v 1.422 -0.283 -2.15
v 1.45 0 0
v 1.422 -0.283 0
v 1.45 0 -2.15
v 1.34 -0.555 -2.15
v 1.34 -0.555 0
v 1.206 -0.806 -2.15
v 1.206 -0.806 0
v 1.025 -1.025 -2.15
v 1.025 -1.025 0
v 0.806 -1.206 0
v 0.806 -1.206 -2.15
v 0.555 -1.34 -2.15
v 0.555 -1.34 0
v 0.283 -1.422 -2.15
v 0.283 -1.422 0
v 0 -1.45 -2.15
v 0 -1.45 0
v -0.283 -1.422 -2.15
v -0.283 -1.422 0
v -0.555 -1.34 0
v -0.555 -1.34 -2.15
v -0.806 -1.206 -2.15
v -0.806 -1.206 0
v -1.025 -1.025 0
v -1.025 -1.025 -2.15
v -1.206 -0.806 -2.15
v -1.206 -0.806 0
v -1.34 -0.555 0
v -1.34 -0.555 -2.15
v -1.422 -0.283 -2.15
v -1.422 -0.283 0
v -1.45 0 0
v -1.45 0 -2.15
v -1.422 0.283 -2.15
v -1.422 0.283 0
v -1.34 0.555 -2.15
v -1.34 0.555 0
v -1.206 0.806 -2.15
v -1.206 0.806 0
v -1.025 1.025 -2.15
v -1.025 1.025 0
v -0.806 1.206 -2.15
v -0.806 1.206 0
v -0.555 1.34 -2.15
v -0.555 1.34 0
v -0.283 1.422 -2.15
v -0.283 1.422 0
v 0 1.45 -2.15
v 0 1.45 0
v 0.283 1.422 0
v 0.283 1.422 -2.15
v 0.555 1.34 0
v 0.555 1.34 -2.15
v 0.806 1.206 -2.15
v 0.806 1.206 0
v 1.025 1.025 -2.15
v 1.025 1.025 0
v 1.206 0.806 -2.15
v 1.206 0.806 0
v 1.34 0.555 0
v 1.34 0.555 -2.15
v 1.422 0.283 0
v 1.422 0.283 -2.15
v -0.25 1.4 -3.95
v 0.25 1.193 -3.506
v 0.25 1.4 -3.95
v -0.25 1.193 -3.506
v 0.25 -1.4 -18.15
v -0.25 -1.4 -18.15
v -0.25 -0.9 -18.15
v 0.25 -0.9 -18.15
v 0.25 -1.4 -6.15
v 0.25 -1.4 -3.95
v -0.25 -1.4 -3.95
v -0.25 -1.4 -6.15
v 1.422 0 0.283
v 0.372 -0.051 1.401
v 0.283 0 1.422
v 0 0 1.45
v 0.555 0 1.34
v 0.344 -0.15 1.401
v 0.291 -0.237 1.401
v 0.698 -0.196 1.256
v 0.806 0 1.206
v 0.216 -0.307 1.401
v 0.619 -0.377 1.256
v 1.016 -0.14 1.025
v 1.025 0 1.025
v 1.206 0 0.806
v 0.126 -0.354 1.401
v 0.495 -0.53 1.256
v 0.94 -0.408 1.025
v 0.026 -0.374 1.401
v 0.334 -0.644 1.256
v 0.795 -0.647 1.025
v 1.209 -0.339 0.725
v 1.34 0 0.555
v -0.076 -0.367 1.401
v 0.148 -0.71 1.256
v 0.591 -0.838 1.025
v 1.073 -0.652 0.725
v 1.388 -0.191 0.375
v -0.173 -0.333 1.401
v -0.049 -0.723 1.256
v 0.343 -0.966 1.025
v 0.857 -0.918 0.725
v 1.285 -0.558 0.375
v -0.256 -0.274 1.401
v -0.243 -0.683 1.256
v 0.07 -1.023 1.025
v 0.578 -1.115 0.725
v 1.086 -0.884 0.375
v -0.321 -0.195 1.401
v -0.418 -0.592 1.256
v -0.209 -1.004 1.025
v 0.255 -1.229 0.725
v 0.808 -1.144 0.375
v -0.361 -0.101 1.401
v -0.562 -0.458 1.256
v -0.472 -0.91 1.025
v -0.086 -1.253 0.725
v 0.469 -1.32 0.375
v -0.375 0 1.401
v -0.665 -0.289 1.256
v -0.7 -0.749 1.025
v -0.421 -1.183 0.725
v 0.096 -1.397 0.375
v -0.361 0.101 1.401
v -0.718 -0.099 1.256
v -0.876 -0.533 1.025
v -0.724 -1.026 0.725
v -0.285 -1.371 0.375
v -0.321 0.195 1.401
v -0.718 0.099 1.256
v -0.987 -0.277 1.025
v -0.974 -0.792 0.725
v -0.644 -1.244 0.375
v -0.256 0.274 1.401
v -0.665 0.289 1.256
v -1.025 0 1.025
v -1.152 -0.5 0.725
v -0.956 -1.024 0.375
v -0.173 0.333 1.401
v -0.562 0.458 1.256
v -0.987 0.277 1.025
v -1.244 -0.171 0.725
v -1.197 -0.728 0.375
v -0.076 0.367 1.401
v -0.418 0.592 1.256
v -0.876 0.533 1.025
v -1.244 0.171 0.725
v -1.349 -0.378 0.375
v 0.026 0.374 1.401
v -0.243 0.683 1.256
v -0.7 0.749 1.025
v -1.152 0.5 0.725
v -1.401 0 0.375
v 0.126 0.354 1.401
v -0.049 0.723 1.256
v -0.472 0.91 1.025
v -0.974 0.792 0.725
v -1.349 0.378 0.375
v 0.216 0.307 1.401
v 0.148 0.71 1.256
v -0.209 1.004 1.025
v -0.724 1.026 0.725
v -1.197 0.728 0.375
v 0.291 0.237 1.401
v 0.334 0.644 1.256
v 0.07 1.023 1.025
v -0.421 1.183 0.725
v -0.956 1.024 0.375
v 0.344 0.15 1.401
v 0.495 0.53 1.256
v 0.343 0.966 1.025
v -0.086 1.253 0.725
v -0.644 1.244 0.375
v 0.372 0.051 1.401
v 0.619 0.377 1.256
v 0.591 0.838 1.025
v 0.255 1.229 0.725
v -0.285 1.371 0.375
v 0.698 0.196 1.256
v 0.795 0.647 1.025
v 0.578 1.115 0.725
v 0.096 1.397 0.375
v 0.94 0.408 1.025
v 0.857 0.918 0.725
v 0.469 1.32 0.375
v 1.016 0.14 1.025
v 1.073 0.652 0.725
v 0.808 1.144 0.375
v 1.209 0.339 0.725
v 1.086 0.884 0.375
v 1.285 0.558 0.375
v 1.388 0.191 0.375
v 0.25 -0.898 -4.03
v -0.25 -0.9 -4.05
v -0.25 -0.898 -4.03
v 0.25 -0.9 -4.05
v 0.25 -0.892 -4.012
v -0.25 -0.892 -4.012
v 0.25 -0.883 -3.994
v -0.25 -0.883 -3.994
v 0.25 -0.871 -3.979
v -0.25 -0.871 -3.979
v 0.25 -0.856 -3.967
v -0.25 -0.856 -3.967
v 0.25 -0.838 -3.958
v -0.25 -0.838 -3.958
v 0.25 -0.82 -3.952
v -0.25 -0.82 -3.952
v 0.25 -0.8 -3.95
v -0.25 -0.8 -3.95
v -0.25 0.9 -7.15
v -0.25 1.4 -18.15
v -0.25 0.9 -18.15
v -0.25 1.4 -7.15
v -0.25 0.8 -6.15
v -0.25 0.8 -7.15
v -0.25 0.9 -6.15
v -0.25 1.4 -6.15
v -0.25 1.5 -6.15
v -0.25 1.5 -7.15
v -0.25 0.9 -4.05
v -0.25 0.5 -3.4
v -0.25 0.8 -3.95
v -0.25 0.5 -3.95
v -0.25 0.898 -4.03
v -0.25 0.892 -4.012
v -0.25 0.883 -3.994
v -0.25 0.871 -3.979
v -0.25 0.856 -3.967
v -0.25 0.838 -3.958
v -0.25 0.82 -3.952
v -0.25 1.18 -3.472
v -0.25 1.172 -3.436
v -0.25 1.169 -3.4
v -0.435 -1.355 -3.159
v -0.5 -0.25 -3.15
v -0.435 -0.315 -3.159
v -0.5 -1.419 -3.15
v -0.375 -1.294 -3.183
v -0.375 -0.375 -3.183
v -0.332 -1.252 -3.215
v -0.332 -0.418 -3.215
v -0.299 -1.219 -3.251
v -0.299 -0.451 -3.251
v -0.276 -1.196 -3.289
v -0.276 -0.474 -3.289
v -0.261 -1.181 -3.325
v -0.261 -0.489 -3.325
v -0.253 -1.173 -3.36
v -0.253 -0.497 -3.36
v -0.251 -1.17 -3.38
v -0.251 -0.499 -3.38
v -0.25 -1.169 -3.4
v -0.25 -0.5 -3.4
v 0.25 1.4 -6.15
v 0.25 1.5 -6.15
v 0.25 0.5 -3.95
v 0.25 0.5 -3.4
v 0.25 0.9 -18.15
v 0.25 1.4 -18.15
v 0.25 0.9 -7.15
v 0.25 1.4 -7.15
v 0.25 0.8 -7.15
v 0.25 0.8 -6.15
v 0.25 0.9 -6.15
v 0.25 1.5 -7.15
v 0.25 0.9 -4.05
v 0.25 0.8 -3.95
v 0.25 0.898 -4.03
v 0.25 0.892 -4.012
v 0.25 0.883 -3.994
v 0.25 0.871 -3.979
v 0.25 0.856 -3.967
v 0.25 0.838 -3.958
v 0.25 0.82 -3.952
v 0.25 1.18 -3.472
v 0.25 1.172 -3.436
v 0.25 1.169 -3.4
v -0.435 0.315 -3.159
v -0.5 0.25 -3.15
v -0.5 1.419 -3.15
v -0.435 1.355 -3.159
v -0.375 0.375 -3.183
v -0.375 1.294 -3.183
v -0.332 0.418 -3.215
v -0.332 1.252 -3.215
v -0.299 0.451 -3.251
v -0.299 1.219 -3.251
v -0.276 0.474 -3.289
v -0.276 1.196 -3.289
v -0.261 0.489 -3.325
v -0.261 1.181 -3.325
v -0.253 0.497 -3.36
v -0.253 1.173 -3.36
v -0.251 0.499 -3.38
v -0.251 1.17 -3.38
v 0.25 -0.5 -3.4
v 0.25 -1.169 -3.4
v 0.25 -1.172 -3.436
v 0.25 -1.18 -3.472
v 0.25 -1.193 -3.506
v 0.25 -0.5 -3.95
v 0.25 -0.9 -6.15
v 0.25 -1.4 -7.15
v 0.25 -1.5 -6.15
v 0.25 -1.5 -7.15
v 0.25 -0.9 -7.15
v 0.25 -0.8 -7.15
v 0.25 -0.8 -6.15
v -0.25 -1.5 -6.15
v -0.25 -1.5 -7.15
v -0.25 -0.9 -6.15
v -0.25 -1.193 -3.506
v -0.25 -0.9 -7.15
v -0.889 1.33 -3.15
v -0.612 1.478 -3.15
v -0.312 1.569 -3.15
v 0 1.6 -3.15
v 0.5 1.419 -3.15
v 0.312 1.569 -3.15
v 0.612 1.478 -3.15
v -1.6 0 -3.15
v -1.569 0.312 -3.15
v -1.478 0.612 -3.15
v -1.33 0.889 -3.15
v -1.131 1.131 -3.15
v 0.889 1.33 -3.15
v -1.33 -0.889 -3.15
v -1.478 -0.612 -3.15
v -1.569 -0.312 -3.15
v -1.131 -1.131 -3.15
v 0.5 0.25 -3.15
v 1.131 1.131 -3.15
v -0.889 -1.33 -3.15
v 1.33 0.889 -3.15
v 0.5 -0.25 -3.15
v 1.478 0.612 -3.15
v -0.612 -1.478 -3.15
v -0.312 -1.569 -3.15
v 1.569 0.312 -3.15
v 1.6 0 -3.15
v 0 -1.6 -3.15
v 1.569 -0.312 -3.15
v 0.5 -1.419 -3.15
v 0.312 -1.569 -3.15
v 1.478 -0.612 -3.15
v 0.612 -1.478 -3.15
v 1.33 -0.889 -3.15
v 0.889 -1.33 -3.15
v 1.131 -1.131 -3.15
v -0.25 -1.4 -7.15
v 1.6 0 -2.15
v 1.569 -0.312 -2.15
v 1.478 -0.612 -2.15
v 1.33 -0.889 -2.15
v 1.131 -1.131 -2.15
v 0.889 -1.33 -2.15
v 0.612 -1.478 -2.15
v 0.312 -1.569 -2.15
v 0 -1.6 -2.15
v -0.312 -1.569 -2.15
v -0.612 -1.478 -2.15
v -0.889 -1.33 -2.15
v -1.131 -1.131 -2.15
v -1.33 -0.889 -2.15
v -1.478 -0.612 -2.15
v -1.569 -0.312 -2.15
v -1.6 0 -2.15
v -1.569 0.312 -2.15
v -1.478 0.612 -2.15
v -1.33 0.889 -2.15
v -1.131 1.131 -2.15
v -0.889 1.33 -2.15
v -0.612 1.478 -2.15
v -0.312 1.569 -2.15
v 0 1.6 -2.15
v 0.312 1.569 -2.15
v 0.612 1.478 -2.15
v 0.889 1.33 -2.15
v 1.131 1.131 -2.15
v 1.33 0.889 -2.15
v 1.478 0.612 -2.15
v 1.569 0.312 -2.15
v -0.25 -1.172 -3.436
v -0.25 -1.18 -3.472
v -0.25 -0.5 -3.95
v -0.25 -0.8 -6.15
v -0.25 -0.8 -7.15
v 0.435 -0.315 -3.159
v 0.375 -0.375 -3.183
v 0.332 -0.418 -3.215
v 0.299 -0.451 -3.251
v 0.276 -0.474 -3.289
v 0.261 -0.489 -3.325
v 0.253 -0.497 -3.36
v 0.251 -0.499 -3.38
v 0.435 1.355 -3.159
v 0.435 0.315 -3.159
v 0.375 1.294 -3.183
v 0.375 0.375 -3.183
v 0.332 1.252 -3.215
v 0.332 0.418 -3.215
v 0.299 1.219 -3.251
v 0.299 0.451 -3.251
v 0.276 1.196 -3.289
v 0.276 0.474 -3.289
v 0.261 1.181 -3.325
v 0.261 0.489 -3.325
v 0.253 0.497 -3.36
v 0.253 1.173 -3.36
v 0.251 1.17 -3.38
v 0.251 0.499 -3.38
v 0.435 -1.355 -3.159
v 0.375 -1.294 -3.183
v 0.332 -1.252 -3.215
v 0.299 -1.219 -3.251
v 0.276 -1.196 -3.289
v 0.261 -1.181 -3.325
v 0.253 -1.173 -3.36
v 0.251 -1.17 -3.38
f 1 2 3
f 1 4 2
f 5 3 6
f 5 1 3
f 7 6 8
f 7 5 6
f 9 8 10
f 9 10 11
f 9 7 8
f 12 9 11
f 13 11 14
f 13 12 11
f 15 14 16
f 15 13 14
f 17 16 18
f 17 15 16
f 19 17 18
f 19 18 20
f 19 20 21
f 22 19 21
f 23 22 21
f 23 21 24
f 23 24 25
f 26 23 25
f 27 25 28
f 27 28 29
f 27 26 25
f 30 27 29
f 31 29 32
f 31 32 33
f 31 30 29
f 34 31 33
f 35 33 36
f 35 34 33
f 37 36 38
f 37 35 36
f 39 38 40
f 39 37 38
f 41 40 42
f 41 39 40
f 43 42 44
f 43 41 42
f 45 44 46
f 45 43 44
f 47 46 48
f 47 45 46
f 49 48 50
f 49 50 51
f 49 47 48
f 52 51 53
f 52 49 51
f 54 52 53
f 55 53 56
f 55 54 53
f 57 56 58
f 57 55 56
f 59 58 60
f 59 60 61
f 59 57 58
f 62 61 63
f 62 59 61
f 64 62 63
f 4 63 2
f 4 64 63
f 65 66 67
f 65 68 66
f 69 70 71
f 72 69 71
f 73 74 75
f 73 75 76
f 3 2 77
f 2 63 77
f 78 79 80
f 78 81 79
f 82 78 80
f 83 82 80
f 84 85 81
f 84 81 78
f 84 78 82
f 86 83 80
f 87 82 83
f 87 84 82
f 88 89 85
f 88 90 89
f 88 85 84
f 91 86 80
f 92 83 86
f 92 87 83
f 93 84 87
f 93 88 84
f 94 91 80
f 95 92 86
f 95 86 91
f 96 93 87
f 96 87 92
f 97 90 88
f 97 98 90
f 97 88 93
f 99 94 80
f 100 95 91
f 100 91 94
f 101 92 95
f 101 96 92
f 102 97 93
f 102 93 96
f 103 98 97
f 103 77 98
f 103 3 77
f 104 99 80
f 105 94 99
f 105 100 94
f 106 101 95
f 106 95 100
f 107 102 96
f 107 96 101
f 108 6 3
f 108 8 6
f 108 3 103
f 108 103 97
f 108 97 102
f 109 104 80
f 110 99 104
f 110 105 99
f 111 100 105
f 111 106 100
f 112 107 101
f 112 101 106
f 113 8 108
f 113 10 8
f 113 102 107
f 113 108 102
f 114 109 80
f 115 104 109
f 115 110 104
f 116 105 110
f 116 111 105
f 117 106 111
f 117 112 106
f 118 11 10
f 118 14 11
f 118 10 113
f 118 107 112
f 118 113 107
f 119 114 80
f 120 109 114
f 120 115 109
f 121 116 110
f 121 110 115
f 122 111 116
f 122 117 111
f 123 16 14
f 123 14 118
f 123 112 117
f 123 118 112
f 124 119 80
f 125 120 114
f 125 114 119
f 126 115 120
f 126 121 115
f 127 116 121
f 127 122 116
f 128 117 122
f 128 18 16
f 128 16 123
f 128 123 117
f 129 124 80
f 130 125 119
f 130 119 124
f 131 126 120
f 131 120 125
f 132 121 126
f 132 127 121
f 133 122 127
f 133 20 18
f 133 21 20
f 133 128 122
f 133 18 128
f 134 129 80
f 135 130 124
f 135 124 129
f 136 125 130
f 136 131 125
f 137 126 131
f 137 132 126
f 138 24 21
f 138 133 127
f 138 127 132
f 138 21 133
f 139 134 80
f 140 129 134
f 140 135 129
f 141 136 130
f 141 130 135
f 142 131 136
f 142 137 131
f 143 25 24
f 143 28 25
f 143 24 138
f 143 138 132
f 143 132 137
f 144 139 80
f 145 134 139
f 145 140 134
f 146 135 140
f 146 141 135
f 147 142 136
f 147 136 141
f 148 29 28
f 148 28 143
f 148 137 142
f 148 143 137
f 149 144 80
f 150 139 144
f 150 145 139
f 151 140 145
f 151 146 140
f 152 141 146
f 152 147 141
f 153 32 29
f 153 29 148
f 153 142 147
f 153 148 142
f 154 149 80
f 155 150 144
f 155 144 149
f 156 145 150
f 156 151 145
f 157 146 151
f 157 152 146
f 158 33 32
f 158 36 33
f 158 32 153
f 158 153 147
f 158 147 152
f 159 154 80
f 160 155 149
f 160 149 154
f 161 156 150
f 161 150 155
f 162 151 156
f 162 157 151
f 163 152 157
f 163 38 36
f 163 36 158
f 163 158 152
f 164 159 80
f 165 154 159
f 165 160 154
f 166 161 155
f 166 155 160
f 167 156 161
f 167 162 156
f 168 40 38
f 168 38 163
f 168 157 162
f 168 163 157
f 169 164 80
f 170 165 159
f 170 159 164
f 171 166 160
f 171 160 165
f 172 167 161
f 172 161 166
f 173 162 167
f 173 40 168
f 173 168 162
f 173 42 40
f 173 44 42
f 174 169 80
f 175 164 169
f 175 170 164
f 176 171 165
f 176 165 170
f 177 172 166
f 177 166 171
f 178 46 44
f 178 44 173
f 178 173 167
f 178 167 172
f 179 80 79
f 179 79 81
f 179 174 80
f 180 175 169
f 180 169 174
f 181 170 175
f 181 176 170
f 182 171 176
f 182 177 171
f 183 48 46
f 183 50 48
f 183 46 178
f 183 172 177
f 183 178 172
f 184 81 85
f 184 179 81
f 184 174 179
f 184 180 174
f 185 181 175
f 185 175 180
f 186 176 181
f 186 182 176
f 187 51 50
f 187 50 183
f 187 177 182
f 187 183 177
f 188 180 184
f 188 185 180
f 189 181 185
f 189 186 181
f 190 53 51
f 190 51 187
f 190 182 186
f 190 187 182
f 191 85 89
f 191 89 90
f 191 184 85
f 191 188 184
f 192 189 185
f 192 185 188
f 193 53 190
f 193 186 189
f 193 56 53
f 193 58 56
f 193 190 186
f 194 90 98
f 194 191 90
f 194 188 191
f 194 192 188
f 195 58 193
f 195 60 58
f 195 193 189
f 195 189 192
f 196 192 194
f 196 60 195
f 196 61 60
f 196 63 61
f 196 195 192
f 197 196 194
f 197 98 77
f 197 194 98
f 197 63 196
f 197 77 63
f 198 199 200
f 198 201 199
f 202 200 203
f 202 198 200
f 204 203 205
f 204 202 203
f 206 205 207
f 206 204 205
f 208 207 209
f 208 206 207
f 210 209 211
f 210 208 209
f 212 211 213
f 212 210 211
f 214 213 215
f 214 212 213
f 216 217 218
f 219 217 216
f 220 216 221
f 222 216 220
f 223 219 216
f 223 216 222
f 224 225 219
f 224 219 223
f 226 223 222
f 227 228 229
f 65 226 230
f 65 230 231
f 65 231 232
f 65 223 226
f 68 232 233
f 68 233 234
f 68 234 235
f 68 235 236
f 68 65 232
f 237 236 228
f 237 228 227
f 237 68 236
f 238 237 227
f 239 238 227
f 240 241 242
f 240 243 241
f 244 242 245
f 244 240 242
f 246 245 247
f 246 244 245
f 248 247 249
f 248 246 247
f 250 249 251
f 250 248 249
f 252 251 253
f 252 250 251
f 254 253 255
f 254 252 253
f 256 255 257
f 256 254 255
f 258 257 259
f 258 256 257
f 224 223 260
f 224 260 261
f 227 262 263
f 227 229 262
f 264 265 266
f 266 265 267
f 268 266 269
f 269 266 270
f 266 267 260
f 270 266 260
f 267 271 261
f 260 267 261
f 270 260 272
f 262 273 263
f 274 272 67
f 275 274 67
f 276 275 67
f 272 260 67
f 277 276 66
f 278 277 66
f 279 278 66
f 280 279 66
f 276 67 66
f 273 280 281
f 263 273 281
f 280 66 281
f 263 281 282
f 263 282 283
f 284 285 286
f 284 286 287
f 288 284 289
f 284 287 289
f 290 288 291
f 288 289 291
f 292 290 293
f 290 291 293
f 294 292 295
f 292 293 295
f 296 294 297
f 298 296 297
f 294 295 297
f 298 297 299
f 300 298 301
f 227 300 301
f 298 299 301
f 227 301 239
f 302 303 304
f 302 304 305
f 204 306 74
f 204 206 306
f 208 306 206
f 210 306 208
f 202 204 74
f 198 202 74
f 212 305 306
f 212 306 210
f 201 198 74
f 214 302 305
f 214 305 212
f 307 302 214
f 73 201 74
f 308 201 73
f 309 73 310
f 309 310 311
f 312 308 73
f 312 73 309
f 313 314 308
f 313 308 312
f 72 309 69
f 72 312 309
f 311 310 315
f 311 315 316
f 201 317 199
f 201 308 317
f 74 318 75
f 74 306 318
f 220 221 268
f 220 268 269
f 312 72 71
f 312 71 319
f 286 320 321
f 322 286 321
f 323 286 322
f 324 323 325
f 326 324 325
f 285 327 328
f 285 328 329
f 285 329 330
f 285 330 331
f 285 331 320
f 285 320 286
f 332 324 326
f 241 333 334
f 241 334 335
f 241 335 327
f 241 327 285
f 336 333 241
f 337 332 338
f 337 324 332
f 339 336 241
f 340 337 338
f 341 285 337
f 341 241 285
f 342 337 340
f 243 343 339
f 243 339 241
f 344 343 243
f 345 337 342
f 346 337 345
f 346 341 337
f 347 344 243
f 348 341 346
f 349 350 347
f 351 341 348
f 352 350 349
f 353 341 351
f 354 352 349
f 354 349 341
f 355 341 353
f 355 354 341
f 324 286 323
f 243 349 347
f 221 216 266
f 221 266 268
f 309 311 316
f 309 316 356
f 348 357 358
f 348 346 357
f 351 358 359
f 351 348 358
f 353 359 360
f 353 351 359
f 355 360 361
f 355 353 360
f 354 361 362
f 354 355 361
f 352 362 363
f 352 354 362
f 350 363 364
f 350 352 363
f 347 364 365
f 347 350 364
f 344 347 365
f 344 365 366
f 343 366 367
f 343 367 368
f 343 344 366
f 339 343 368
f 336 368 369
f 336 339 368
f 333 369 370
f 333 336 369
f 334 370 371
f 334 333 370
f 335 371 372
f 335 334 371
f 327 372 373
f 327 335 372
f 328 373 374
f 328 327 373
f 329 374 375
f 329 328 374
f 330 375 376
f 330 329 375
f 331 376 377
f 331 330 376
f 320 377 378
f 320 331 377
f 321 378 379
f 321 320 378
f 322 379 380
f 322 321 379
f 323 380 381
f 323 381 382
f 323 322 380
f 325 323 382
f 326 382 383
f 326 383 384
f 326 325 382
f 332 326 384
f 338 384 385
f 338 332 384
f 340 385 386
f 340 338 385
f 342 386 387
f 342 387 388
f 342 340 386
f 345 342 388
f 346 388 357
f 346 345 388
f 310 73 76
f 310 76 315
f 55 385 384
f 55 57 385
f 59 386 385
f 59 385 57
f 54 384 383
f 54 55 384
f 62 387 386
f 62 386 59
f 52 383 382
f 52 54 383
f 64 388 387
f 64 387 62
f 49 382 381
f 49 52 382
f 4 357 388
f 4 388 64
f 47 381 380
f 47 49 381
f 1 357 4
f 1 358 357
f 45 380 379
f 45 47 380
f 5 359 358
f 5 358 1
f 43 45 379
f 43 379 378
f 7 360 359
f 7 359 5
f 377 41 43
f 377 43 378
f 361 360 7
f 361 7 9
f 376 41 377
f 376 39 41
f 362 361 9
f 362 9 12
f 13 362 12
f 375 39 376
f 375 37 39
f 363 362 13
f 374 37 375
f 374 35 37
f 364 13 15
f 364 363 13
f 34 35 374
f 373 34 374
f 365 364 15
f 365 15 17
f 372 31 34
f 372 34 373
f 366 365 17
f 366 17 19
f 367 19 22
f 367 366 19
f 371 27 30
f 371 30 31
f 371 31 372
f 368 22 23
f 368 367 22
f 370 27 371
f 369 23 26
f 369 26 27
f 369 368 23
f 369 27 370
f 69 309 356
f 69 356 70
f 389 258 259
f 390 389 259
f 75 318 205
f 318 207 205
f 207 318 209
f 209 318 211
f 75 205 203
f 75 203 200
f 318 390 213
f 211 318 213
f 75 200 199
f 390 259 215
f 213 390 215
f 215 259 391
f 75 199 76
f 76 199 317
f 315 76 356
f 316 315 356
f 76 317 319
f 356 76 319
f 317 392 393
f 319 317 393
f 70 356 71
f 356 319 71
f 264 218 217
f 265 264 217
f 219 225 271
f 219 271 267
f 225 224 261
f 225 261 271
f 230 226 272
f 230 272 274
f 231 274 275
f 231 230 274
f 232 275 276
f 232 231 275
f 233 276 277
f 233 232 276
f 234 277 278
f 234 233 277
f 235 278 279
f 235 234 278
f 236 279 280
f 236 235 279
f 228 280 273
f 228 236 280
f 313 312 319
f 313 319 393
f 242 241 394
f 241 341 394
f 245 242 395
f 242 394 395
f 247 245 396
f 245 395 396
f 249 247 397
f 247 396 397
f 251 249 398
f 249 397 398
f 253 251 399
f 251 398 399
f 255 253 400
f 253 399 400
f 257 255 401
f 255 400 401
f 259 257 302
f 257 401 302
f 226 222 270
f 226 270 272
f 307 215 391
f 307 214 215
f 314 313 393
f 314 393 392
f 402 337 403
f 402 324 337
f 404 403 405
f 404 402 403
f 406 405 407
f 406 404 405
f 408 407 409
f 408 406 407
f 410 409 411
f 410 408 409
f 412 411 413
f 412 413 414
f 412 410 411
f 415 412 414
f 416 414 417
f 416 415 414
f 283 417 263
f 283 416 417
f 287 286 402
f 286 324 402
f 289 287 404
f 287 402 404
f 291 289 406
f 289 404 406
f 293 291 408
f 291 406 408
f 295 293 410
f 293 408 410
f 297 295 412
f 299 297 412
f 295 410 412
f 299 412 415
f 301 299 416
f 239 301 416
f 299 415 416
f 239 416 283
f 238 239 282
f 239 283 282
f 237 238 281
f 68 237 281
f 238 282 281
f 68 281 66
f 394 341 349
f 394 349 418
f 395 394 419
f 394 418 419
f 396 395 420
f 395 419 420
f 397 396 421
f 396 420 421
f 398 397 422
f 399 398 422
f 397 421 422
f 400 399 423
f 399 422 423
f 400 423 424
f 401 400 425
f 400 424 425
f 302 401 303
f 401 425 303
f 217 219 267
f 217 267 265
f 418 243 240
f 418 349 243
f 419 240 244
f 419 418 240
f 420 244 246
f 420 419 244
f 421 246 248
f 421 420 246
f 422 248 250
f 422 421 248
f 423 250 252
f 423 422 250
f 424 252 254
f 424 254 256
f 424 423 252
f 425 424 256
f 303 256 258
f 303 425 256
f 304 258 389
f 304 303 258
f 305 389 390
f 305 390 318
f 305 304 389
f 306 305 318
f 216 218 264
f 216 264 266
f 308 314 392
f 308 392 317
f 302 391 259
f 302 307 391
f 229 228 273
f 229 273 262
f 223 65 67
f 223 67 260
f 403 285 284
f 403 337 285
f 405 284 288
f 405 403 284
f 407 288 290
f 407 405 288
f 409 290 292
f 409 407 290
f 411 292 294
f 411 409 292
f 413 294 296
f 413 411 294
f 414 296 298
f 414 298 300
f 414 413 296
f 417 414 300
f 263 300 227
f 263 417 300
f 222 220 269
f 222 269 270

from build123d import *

# Parameters (mm, degrees)
EXTRUDE1_DEPTH          = 0.25
FILLET1_R               = 0.25
CUT_EXTRUDE1_DEPTH      = 31.234789562
CUT_EXTRUDE1_DEPTH_BACK = 31.234789562
SKETCH3_W               = 12
SKETCH3_H               = 2.8


with BuildPart() as part:
    # Sketch1 → Revolve1 (revolve)
    with BuildSketch(Plane(origin=(0, 0, 0), x_dir=(0, 0, -1), z_dir=(1, 0, 0)), mode=Mode.PRIVATE) as revolve1_sk:
        with BuildLine():
            Line((0, 1.45), (2.15, 1.45))
            Line((2.15, 1.45), (2.15, 1.599999975))
            Line((2.15, 1.599999975), (3.15, 1.599999975))
            Line((3.15, 1.599999975), (3.15, 0))
            Line((3.15, 0), (-1.45, 0))
            ThreePointArc((-1.45, 0), (-1.025304833, 1.025304833), (0, 1.45))
        make_face()
    revolve(revolve1_sk.sketch.rotate(Axis((0, 0, 0), (0, 0, -1)), 90), axis=Axis((0, 0, 0), (0, 0, -1)))

    # Sketch2 → Extrude1 (add, symmetric)
    with BuildSketch(Plane(origin=(0, 0, 0), x_dir=(0, 0, -1), z_dir=(1, 0, 0))):
        with BuildLine():
            Line((3.15, 1.026953873), (3.95, 1.4))
            Line((3.95, 1.4), (6.15, 1.4))
            Line((6.15, 1.4), (6.15, 1.5))
            Line((6.15, 1.5), (7.15, 1.5))
            Line((7.15, 1.5), (7.15, 1.4))
            Line((7.15, 1.4), (30.15, 1.4))
            Line((30.15, 1.4), (30.15, 0.9))
            Line((30.15, 0.9), (7.15, 0.9))
            Line((7.15, 0.9), (7.15, 0.8))
            Line((7.15, 0.8), (6.15, 0.8))
            Line((6.15, 0.8), (6.15, 0.9))
            Line((6.15, 0.9), (4.05, 0.9))
            ThreePointArc((4.05, 0.9), (3.979289322, 0.870710678), (3.95, 0.8))
            Line((3.95, 0.8), (3.95, 0.5))
            Line((3.95, 0.5), (3.15, 0.5))
            Line((3.15, 0.5), (3.15, 1.026953873))
        make_face()
        with BuildLine():
            Line((3.95, -0.8), (3.95, -0.5))
            Line((3.95, -0.5), (3.15, -0.5))
            Line((3.15, -0.5), (3.15, -1.026953873))
            Line((3.15, -1.026953873), (3.95, -1.4))
            Line((3.95, -1.4), (6.15, -1.4))
            Line((6.15, -1.4), (6.15, -1.5))
            Line((6.15, -1.5), (7.15, -1.5))
            Line((7.15, -1.5), (7.15, -1.4))
            Line((7.15, -1.4), (30.15, -1.4))
            Line((30.15, -1.4), (30.15, -0.9))
            Line((30.15, -0.9), (7.15, -0.9))
            Line((7.15, -0.9), (7.15, -0.8))
            Line((7.15, -0.8), (6.15, -0.8))
            Line((6.15, -0.8), (6.15, -0.9))
            Line((6.15, -0.9), (4.05, -0.9))
            ThreePointArc((4.05, -0.9), (3.979289322, -0.870710678), (3.95, -0.8))
        make_face()
    extrude(amount=EXTRUDE1_DEPTH, both=True)

    # Fillet1
    fillet1_edges = [part.edges().sort_by_distance(p)[0] for p in [
        (-0.25, 0.763476937, -3.15),
        (0, 1.026953873, -3.15),
        (0, 0.5, -3.15),
        (0.25, 0.763476937, -3.15),
        (-0.25, -0.763476937, -3.15),
        (0, -0.5, -3.15),
        (0, -1.026953873, -3.15),
        (0.25, -0.763476937, -3.15),
    ]]
    fillet(fillet1_edges, radius=FILLET1_R)

    # Sketch3 → Cut-Extrude1 (cut, two sides: drawn at the far end of the back side and taken through both)
    with BuildSketch(Plane(origin=(0, 0, 0), x_dir=(0, 0, -1), z_dir=(1, 0, 0)).offset(-CUT_EXTRUDE1_DEPTH_BACK)):
        with Locations((24.15, 0)):
            Rectangle(SKETCH3_W, SKETCH3_H)
    extrude(amount=CUT_EXTRUDE1_DEPTH + CUT_EXTRUDE1_DEPTH_BACK, mode=Mode.SUBTRACT)


solid = part.part
